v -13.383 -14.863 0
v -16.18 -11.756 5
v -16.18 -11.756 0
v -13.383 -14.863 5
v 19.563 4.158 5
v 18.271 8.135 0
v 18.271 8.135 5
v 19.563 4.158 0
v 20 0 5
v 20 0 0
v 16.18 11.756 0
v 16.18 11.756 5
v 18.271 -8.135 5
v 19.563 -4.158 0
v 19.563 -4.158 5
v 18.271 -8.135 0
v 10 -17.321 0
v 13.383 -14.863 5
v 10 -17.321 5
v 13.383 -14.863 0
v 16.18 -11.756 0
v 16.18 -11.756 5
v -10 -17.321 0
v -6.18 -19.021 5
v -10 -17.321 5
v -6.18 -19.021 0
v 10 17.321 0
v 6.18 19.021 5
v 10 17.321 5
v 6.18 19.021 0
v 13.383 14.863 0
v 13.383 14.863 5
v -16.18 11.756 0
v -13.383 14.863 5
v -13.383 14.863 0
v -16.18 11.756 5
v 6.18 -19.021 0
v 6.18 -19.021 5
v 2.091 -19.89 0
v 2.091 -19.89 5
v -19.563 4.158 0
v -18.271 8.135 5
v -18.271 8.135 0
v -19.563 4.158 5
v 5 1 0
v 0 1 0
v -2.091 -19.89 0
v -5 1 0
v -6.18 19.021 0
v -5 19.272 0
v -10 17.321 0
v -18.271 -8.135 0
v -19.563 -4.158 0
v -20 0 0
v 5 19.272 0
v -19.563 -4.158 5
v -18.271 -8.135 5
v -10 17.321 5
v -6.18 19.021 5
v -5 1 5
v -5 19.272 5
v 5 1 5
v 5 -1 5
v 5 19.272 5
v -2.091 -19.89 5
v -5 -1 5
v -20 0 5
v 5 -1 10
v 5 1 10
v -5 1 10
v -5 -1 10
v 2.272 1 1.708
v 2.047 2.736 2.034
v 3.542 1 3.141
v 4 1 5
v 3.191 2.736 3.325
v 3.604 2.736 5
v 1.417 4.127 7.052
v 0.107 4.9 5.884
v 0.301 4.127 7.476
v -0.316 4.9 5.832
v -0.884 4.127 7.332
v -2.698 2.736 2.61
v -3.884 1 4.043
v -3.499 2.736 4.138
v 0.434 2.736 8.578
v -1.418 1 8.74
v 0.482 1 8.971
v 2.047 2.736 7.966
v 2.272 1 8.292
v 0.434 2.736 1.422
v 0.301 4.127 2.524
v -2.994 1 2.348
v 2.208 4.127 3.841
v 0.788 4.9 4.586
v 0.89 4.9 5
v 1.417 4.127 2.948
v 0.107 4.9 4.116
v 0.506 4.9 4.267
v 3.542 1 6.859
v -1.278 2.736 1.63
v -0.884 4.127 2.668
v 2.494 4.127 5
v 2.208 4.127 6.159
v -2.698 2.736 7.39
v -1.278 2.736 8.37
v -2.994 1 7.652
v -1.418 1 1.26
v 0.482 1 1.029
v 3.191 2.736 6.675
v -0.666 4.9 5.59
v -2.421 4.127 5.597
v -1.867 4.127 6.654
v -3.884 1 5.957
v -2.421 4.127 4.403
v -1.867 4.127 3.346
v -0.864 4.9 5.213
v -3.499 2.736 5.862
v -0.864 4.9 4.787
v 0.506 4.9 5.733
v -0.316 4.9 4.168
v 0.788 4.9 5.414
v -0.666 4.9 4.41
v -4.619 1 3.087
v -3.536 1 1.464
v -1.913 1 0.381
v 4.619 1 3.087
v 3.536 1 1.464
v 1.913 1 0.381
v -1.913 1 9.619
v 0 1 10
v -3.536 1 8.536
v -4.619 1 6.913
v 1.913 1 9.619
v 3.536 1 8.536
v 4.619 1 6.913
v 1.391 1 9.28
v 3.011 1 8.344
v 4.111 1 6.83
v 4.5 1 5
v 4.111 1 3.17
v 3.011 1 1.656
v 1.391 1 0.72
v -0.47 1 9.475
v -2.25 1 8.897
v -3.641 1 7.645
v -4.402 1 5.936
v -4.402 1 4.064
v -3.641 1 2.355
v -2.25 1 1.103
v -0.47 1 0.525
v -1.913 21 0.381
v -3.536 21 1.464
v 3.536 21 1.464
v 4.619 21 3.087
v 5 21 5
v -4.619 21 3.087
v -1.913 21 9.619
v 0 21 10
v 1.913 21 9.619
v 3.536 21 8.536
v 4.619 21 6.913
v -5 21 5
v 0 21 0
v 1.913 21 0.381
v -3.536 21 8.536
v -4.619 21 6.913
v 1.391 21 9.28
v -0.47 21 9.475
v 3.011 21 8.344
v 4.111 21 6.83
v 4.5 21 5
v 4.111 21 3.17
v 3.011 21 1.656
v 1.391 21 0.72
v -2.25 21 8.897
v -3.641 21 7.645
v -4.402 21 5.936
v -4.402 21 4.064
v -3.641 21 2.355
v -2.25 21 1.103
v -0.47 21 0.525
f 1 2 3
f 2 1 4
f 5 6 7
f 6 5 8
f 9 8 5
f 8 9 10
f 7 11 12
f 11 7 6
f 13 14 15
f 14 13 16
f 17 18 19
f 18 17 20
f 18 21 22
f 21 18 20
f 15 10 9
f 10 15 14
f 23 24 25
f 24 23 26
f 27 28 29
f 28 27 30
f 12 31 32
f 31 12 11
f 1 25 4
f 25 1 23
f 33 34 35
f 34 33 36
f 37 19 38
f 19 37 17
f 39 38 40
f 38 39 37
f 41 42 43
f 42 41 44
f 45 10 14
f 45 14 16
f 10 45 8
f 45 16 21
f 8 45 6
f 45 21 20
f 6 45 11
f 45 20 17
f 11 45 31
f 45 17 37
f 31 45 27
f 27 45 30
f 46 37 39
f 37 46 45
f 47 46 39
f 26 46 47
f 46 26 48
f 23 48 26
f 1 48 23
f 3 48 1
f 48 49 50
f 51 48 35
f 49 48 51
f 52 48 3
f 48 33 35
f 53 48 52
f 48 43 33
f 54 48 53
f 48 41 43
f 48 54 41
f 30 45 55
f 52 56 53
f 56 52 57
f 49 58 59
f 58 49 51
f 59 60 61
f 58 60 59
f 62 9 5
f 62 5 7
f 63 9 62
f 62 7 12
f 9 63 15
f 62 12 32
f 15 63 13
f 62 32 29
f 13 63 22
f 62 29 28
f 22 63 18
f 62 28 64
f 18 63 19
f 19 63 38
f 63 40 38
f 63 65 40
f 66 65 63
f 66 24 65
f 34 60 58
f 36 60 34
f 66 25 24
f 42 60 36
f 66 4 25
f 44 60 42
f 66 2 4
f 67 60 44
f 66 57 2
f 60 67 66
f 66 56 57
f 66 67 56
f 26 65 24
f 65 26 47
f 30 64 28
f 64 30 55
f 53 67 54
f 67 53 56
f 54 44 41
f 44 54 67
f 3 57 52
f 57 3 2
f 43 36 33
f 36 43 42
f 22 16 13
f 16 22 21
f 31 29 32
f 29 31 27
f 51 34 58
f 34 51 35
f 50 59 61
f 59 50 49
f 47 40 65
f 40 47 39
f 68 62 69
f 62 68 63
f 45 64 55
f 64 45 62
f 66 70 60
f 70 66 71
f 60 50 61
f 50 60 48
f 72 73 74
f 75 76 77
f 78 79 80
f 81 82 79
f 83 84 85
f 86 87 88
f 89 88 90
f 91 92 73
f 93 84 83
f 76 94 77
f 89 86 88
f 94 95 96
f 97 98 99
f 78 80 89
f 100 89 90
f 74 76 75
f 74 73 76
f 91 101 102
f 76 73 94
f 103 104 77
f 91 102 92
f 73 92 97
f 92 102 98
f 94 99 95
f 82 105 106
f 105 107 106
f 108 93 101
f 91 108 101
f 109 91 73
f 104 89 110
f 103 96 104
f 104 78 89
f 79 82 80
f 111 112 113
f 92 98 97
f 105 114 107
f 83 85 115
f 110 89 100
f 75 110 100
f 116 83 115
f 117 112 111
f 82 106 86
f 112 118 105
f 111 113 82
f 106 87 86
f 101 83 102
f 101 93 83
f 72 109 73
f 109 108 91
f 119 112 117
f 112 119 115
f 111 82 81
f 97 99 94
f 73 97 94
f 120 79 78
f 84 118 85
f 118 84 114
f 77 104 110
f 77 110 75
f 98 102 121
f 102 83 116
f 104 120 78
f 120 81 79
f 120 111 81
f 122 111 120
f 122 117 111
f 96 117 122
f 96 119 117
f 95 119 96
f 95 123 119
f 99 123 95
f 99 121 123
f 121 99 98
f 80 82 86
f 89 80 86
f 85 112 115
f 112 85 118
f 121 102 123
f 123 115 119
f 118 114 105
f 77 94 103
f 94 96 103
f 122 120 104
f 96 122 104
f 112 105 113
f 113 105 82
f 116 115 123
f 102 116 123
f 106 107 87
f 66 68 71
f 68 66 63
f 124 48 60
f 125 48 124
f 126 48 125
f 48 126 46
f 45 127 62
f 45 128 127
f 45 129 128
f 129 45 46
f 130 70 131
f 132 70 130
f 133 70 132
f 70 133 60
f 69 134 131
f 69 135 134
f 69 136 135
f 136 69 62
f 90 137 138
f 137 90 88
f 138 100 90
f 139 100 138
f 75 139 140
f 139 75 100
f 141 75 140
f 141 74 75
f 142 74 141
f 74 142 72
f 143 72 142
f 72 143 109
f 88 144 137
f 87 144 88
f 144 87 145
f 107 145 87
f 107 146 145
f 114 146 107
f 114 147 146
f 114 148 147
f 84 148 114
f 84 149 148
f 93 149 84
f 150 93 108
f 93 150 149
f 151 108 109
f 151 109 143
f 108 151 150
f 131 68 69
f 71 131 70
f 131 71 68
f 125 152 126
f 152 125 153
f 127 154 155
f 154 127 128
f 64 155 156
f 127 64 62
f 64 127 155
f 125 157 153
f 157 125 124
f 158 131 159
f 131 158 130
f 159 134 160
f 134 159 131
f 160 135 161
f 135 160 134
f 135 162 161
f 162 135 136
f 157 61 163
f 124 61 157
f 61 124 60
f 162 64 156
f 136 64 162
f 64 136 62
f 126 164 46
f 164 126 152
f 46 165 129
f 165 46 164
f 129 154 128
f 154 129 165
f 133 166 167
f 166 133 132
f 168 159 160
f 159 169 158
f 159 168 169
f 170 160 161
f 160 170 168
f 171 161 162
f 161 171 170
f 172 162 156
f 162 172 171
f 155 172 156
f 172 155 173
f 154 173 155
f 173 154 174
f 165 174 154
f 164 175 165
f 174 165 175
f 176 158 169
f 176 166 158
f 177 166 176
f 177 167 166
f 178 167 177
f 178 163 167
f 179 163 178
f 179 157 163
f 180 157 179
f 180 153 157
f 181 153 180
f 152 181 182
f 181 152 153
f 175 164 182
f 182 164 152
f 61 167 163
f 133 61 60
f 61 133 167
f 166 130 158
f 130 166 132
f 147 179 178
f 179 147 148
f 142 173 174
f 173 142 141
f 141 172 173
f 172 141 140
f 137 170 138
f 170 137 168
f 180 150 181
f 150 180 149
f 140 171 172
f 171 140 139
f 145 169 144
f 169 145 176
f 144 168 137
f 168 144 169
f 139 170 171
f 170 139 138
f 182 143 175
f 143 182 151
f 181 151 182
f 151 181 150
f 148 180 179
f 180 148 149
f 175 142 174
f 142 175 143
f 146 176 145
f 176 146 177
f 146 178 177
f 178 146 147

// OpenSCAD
height = 5;

translate([0, 0, height/2]) PCB();
translate([0, 0, 5]) LED();
translate([0, 1, 5]) tube();


module LED() {
  rotate([90, 0, 0]){
    cube([10, 10, 2], true);
    difference(){
    translate([0, 0, -1])
    sphere(4, $fn = 0, $fa=12, $fs=2); 
    translate([0, 0, 5])
    cube([10, 10, 10], true);
    }
  }
}

module PCB() {
    color("Olive", 0.5){
  difference(){
    cylinder(height, r1=20, r2=20, center=true);  
    translate([0, 10, 0])
    cube([10, 20, height],true);
   }
}
}

module tube(){
 rotate([-90, 0, 0]){
   difference(){
     cylinder(20, 5, 5, center=false);
     cylinder(20, 4.5, 4.5, center=false);
     }
   }
}
